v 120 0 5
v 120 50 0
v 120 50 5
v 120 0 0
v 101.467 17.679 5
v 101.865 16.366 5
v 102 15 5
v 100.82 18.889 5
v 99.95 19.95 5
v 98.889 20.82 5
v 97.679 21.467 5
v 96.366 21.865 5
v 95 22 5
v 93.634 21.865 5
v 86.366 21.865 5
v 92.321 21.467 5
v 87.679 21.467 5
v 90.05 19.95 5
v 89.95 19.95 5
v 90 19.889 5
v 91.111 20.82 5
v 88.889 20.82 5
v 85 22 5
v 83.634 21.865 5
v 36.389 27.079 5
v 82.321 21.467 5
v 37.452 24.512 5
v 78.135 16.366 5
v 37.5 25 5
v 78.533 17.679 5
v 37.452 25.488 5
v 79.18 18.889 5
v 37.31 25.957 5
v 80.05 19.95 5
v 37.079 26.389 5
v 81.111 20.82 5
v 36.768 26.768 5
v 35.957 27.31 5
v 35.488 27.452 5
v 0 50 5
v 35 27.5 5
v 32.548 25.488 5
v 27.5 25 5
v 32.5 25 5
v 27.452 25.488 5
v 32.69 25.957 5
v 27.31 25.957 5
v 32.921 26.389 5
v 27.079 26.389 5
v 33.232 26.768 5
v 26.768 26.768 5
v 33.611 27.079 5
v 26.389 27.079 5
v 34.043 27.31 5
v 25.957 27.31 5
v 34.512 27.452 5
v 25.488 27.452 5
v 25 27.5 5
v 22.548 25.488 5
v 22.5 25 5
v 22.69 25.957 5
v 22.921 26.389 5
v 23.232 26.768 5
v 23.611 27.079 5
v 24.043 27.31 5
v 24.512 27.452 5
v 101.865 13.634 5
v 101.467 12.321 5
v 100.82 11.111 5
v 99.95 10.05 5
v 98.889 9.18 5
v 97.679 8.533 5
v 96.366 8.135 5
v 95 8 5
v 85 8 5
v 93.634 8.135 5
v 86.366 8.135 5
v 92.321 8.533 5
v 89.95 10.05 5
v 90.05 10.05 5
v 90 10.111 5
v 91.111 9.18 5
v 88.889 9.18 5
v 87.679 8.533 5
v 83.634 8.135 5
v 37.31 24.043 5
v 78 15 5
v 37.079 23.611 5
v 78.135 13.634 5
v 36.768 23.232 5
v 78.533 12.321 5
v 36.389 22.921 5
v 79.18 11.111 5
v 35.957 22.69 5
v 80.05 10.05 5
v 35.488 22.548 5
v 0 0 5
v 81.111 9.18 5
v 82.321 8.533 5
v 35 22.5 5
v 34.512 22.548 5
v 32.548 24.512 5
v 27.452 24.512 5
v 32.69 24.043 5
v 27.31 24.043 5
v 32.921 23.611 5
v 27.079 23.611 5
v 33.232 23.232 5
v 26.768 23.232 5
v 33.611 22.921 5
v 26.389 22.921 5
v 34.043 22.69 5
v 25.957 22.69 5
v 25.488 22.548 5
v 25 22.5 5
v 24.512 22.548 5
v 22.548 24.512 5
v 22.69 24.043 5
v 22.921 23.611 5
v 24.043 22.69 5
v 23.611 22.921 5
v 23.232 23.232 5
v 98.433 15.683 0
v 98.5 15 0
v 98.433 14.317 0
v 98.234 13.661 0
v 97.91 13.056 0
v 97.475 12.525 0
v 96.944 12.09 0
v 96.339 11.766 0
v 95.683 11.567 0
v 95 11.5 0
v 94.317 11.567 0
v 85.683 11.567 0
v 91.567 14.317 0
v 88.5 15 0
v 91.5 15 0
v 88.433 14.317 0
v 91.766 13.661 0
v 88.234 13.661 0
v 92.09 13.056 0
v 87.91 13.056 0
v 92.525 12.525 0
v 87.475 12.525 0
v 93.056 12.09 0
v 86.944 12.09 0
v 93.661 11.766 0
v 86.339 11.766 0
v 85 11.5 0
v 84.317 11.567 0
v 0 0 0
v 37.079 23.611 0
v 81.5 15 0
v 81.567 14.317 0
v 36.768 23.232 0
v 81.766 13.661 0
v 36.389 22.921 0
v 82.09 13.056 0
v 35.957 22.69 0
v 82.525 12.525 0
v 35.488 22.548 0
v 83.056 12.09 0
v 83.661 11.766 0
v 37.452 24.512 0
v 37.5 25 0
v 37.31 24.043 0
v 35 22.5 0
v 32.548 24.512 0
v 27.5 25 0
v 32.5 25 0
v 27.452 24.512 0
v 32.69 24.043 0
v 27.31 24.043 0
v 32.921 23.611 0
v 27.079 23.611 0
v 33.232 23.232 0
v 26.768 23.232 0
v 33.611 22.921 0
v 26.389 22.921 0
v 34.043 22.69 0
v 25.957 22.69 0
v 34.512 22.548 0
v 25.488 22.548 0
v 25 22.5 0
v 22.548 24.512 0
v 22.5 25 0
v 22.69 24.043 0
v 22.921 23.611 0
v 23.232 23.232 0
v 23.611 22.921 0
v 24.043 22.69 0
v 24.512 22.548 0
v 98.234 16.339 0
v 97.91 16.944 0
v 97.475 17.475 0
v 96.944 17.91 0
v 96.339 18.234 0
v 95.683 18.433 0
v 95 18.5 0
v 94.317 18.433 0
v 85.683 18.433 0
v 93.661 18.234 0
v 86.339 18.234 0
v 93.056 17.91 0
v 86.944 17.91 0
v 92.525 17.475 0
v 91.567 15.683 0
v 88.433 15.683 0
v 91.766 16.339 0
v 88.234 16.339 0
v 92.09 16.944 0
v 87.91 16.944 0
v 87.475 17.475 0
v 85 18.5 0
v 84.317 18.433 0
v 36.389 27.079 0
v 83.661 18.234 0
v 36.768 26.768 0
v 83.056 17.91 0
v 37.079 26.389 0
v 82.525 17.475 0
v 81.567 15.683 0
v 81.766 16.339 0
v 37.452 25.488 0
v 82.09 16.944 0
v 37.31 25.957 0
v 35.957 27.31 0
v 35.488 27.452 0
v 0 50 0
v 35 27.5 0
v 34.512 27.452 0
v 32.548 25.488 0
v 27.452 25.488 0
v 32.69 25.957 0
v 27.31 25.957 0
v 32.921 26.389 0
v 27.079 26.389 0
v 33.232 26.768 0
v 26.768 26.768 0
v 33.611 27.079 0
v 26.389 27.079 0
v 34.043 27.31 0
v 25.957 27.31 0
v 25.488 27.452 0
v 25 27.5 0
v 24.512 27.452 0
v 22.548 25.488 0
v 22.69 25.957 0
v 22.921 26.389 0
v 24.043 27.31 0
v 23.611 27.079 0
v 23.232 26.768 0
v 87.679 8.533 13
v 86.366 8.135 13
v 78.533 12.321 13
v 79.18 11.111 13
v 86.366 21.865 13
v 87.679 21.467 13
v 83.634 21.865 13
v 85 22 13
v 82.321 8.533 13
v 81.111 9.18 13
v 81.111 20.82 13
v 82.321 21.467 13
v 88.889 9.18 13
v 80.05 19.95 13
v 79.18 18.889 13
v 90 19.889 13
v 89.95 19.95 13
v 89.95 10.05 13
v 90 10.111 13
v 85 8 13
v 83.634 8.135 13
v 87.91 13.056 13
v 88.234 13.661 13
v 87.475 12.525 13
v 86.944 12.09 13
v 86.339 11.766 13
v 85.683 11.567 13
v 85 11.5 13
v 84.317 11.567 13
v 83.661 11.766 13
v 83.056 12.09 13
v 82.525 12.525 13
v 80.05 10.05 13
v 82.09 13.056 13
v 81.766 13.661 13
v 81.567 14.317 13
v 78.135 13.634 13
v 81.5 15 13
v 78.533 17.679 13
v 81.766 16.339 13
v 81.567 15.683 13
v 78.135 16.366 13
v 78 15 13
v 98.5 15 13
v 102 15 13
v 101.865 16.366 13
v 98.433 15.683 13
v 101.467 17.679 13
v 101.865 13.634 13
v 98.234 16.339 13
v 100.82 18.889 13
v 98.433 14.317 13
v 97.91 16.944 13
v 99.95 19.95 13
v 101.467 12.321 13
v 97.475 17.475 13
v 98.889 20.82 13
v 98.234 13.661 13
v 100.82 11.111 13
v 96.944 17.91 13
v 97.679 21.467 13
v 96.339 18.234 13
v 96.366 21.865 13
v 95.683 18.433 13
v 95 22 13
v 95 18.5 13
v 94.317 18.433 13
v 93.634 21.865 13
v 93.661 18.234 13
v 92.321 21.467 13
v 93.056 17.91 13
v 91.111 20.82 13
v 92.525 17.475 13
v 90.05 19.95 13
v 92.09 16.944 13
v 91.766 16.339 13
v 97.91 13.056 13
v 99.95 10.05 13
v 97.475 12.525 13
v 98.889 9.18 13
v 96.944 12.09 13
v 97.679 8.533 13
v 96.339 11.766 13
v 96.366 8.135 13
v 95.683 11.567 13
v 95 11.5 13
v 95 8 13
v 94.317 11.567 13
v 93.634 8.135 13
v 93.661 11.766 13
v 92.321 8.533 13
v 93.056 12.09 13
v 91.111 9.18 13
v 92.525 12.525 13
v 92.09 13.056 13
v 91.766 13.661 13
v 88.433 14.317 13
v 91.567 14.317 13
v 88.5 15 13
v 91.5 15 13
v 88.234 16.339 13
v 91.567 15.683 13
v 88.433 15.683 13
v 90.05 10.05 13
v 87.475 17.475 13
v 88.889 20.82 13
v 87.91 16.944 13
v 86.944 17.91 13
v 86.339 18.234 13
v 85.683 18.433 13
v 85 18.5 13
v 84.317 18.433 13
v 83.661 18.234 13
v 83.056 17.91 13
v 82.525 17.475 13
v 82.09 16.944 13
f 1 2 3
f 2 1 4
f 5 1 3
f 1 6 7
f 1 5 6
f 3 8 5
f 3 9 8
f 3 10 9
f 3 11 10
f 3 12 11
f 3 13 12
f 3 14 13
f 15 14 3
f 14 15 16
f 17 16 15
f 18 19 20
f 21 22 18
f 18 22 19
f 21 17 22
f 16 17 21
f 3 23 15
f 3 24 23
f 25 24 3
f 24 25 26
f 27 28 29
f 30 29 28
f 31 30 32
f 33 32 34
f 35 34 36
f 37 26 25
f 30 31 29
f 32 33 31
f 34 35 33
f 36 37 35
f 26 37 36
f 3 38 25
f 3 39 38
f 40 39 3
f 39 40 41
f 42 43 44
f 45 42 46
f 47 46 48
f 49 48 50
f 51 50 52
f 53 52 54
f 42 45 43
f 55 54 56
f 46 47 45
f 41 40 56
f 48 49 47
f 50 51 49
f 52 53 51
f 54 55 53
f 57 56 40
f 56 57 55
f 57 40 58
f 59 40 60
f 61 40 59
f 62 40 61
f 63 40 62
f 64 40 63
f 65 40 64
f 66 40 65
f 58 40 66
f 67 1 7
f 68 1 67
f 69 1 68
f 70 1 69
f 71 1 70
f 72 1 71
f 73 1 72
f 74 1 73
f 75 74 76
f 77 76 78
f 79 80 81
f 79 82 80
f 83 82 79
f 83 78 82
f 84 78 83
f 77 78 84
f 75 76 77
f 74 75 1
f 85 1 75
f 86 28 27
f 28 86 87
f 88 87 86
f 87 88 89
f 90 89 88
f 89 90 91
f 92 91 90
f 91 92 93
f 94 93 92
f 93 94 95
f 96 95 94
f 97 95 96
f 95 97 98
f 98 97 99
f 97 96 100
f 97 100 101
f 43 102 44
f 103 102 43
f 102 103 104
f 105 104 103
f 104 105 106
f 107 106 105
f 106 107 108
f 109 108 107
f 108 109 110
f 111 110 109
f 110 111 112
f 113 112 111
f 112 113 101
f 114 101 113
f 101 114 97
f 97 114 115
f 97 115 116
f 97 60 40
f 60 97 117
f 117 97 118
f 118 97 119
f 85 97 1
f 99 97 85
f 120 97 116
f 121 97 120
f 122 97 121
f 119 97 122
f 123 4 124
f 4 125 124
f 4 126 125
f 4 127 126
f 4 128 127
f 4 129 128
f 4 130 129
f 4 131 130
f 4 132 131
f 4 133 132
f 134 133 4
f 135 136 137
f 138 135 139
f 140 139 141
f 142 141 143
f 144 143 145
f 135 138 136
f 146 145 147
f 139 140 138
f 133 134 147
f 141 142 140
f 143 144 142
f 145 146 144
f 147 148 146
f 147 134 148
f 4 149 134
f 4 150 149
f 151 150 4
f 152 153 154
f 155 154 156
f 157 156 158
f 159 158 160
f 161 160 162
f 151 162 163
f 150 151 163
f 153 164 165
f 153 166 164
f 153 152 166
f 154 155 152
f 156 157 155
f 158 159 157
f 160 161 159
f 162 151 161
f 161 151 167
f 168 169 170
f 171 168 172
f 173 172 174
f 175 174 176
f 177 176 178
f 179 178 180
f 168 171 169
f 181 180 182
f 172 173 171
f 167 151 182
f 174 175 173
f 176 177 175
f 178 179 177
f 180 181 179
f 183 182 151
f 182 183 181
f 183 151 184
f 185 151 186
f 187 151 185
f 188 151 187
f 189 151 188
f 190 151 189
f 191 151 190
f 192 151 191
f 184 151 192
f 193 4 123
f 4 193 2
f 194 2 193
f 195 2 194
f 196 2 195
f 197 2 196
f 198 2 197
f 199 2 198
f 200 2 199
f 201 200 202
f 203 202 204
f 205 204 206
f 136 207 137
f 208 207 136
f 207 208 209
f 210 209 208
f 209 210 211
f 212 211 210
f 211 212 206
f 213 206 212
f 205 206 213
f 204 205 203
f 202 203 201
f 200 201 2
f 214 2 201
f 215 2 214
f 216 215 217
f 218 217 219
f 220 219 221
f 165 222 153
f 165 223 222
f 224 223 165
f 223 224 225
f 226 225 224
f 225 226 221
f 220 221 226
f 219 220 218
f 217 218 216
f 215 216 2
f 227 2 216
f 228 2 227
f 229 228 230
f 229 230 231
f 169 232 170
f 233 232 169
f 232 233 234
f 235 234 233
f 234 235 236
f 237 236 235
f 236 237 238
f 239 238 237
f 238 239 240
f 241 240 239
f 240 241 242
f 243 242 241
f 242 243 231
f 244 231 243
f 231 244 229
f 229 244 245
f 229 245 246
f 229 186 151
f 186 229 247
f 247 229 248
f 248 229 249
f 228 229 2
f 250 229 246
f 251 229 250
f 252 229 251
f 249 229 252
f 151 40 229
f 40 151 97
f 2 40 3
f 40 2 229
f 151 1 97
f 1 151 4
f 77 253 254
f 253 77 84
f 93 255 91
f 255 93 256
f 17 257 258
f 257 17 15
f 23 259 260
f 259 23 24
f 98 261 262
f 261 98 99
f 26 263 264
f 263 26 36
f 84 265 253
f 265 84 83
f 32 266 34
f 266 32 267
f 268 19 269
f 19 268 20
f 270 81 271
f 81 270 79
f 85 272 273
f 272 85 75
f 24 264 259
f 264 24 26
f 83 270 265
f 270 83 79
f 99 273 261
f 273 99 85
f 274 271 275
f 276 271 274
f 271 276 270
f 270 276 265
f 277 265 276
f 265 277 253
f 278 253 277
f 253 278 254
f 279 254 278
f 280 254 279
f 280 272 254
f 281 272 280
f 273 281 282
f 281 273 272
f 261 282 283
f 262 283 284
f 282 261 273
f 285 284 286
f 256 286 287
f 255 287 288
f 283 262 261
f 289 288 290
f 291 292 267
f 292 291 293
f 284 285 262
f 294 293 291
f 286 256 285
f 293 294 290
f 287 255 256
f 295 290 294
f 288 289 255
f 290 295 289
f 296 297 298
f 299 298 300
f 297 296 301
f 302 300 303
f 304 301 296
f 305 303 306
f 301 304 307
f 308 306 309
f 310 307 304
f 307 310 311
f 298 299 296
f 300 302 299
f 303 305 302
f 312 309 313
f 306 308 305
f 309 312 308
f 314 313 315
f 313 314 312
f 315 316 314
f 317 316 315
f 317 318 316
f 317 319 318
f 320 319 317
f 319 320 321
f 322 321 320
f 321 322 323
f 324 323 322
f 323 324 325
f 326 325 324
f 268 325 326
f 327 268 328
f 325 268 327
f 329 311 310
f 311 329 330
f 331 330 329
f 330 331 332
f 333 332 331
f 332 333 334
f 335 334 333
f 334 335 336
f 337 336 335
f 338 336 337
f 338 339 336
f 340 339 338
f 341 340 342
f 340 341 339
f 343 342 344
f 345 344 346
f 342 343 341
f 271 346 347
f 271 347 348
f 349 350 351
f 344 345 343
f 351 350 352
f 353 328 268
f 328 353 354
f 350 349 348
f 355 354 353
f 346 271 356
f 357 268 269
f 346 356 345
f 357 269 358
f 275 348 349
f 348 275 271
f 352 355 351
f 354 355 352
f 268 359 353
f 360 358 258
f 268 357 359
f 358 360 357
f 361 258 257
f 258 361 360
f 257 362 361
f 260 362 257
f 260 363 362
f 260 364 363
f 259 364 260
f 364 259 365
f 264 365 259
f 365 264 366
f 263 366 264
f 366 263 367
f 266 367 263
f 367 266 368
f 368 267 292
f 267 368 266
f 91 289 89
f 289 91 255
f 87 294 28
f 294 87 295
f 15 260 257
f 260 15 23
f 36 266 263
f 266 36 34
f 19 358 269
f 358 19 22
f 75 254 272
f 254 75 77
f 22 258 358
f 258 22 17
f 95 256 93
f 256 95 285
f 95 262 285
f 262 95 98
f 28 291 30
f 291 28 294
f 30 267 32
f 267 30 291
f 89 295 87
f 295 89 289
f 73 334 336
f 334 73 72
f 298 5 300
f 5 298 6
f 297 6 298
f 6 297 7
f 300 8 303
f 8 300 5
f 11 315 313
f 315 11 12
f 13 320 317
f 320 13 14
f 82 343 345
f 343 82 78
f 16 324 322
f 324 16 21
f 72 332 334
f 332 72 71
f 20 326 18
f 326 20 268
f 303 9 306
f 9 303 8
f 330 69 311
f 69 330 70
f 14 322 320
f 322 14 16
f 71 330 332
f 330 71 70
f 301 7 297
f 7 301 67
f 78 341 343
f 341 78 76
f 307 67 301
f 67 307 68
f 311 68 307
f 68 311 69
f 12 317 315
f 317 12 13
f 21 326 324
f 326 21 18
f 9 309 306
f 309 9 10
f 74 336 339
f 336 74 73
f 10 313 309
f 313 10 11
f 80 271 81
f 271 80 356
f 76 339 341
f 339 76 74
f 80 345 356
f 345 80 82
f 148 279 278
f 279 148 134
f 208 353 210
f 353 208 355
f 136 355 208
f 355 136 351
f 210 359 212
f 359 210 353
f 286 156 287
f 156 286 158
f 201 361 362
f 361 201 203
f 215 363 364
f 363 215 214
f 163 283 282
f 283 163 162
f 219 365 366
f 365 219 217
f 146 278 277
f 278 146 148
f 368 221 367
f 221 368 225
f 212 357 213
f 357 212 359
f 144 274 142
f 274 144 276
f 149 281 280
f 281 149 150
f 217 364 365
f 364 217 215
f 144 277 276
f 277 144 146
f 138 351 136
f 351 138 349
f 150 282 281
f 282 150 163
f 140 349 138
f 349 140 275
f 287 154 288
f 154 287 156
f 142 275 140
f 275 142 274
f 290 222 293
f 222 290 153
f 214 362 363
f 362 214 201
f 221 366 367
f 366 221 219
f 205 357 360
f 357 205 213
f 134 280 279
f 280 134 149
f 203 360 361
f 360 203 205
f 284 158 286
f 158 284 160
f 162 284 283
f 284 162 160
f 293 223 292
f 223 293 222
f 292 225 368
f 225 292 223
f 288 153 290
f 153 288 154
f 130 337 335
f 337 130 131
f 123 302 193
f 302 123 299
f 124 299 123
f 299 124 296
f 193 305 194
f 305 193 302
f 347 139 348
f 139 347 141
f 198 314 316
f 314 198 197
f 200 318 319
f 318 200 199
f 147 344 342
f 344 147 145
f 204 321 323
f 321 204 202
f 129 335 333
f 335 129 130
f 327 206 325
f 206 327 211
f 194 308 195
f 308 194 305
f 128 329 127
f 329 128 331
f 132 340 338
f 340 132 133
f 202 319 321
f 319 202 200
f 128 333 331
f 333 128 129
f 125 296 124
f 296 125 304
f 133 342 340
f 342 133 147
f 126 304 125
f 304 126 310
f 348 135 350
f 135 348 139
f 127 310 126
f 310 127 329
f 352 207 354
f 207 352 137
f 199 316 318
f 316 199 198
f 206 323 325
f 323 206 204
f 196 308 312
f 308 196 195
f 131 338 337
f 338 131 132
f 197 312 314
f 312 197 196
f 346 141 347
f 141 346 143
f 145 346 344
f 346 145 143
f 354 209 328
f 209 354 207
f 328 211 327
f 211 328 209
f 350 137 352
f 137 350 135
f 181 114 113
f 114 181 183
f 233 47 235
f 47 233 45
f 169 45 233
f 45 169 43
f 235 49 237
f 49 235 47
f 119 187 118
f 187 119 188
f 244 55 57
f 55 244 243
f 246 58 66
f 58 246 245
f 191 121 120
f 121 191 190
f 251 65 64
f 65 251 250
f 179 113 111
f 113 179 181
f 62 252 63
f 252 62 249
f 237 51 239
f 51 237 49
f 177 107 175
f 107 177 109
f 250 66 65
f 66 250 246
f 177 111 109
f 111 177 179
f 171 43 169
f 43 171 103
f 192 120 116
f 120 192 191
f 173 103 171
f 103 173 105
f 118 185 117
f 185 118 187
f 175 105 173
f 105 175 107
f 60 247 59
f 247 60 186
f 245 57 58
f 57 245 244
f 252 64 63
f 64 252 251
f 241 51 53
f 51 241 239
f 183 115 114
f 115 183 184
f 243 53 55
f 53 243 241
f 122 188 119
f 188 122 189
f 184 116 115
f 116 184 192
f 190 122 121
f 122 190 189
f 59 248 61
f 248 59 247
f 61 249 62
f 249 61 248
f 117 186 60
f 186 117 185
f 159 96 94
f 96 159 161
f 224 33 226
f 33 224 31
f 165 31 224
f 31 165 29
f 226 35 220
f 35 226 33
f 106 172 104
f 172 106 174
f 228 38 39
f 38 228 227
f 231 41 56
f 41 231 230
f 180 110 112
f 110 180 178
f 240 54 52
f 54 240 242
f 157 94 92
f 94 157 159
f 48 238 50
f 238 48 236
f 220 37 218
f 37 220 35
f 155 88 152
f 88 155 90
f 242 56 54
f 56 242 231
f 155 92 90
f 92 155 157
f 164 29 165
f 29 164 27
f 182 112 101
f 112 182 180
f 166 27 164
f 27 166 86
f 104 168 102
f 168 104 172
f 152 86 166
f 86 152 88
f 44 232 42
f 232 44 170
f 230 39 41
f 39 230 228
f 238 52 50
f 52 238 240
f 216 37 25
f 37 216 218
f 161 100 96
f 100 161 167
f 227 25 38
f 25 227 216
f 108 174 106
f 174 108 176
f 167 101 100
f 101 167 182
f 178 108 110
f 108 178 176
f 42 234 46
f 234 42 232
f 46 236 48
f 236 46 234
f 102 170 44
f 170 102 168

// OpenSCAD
$fn = 32;

// ----------------------------------------------------------------------
// Mixed field: bosses and holes at given coordinates
// ----------------------------------------------------------------------

// --- parameters (mm) ---
plate_l = 120;            // plate length, X
plate_w = 50;             // plate width, Y
plate_t = 5;              // plate thickness, Z
boss_d = 14;              // boss diameter
boss_h = 8;               // boss height above the plate
hole_d = 5;               // through hole diameter
fit_tol = 0.1;            // tolerance for press fits, mm
free_tol = 0.3;           // tolerance for clearance fits, mm

total_h = plate_t + boss_h;  // overall height

difference() {
  union() {
    cube([plate_l, plate_w, plate_t]);
    translate([85, 15, plate_t]) cylinder(h = boss_h, d = boss_d);
    translate([95, 15, plate_t]) cylinder(h = boss_h, d = boss_d);
  }
  translate([85, 15, -1]) cylinder(h = total_h + 2, d = boss_d / 2);
  translate([95, 15, -1]) cylinder(h = total_h + 2, d = boss_d / 2);
  translate([25, 25, -1]) cylinder(h = plate_t + 2, d = hole_d);
  translate([35, 25, -1]) cylinder(h = plate_t + 2, d = hole_d);
}
